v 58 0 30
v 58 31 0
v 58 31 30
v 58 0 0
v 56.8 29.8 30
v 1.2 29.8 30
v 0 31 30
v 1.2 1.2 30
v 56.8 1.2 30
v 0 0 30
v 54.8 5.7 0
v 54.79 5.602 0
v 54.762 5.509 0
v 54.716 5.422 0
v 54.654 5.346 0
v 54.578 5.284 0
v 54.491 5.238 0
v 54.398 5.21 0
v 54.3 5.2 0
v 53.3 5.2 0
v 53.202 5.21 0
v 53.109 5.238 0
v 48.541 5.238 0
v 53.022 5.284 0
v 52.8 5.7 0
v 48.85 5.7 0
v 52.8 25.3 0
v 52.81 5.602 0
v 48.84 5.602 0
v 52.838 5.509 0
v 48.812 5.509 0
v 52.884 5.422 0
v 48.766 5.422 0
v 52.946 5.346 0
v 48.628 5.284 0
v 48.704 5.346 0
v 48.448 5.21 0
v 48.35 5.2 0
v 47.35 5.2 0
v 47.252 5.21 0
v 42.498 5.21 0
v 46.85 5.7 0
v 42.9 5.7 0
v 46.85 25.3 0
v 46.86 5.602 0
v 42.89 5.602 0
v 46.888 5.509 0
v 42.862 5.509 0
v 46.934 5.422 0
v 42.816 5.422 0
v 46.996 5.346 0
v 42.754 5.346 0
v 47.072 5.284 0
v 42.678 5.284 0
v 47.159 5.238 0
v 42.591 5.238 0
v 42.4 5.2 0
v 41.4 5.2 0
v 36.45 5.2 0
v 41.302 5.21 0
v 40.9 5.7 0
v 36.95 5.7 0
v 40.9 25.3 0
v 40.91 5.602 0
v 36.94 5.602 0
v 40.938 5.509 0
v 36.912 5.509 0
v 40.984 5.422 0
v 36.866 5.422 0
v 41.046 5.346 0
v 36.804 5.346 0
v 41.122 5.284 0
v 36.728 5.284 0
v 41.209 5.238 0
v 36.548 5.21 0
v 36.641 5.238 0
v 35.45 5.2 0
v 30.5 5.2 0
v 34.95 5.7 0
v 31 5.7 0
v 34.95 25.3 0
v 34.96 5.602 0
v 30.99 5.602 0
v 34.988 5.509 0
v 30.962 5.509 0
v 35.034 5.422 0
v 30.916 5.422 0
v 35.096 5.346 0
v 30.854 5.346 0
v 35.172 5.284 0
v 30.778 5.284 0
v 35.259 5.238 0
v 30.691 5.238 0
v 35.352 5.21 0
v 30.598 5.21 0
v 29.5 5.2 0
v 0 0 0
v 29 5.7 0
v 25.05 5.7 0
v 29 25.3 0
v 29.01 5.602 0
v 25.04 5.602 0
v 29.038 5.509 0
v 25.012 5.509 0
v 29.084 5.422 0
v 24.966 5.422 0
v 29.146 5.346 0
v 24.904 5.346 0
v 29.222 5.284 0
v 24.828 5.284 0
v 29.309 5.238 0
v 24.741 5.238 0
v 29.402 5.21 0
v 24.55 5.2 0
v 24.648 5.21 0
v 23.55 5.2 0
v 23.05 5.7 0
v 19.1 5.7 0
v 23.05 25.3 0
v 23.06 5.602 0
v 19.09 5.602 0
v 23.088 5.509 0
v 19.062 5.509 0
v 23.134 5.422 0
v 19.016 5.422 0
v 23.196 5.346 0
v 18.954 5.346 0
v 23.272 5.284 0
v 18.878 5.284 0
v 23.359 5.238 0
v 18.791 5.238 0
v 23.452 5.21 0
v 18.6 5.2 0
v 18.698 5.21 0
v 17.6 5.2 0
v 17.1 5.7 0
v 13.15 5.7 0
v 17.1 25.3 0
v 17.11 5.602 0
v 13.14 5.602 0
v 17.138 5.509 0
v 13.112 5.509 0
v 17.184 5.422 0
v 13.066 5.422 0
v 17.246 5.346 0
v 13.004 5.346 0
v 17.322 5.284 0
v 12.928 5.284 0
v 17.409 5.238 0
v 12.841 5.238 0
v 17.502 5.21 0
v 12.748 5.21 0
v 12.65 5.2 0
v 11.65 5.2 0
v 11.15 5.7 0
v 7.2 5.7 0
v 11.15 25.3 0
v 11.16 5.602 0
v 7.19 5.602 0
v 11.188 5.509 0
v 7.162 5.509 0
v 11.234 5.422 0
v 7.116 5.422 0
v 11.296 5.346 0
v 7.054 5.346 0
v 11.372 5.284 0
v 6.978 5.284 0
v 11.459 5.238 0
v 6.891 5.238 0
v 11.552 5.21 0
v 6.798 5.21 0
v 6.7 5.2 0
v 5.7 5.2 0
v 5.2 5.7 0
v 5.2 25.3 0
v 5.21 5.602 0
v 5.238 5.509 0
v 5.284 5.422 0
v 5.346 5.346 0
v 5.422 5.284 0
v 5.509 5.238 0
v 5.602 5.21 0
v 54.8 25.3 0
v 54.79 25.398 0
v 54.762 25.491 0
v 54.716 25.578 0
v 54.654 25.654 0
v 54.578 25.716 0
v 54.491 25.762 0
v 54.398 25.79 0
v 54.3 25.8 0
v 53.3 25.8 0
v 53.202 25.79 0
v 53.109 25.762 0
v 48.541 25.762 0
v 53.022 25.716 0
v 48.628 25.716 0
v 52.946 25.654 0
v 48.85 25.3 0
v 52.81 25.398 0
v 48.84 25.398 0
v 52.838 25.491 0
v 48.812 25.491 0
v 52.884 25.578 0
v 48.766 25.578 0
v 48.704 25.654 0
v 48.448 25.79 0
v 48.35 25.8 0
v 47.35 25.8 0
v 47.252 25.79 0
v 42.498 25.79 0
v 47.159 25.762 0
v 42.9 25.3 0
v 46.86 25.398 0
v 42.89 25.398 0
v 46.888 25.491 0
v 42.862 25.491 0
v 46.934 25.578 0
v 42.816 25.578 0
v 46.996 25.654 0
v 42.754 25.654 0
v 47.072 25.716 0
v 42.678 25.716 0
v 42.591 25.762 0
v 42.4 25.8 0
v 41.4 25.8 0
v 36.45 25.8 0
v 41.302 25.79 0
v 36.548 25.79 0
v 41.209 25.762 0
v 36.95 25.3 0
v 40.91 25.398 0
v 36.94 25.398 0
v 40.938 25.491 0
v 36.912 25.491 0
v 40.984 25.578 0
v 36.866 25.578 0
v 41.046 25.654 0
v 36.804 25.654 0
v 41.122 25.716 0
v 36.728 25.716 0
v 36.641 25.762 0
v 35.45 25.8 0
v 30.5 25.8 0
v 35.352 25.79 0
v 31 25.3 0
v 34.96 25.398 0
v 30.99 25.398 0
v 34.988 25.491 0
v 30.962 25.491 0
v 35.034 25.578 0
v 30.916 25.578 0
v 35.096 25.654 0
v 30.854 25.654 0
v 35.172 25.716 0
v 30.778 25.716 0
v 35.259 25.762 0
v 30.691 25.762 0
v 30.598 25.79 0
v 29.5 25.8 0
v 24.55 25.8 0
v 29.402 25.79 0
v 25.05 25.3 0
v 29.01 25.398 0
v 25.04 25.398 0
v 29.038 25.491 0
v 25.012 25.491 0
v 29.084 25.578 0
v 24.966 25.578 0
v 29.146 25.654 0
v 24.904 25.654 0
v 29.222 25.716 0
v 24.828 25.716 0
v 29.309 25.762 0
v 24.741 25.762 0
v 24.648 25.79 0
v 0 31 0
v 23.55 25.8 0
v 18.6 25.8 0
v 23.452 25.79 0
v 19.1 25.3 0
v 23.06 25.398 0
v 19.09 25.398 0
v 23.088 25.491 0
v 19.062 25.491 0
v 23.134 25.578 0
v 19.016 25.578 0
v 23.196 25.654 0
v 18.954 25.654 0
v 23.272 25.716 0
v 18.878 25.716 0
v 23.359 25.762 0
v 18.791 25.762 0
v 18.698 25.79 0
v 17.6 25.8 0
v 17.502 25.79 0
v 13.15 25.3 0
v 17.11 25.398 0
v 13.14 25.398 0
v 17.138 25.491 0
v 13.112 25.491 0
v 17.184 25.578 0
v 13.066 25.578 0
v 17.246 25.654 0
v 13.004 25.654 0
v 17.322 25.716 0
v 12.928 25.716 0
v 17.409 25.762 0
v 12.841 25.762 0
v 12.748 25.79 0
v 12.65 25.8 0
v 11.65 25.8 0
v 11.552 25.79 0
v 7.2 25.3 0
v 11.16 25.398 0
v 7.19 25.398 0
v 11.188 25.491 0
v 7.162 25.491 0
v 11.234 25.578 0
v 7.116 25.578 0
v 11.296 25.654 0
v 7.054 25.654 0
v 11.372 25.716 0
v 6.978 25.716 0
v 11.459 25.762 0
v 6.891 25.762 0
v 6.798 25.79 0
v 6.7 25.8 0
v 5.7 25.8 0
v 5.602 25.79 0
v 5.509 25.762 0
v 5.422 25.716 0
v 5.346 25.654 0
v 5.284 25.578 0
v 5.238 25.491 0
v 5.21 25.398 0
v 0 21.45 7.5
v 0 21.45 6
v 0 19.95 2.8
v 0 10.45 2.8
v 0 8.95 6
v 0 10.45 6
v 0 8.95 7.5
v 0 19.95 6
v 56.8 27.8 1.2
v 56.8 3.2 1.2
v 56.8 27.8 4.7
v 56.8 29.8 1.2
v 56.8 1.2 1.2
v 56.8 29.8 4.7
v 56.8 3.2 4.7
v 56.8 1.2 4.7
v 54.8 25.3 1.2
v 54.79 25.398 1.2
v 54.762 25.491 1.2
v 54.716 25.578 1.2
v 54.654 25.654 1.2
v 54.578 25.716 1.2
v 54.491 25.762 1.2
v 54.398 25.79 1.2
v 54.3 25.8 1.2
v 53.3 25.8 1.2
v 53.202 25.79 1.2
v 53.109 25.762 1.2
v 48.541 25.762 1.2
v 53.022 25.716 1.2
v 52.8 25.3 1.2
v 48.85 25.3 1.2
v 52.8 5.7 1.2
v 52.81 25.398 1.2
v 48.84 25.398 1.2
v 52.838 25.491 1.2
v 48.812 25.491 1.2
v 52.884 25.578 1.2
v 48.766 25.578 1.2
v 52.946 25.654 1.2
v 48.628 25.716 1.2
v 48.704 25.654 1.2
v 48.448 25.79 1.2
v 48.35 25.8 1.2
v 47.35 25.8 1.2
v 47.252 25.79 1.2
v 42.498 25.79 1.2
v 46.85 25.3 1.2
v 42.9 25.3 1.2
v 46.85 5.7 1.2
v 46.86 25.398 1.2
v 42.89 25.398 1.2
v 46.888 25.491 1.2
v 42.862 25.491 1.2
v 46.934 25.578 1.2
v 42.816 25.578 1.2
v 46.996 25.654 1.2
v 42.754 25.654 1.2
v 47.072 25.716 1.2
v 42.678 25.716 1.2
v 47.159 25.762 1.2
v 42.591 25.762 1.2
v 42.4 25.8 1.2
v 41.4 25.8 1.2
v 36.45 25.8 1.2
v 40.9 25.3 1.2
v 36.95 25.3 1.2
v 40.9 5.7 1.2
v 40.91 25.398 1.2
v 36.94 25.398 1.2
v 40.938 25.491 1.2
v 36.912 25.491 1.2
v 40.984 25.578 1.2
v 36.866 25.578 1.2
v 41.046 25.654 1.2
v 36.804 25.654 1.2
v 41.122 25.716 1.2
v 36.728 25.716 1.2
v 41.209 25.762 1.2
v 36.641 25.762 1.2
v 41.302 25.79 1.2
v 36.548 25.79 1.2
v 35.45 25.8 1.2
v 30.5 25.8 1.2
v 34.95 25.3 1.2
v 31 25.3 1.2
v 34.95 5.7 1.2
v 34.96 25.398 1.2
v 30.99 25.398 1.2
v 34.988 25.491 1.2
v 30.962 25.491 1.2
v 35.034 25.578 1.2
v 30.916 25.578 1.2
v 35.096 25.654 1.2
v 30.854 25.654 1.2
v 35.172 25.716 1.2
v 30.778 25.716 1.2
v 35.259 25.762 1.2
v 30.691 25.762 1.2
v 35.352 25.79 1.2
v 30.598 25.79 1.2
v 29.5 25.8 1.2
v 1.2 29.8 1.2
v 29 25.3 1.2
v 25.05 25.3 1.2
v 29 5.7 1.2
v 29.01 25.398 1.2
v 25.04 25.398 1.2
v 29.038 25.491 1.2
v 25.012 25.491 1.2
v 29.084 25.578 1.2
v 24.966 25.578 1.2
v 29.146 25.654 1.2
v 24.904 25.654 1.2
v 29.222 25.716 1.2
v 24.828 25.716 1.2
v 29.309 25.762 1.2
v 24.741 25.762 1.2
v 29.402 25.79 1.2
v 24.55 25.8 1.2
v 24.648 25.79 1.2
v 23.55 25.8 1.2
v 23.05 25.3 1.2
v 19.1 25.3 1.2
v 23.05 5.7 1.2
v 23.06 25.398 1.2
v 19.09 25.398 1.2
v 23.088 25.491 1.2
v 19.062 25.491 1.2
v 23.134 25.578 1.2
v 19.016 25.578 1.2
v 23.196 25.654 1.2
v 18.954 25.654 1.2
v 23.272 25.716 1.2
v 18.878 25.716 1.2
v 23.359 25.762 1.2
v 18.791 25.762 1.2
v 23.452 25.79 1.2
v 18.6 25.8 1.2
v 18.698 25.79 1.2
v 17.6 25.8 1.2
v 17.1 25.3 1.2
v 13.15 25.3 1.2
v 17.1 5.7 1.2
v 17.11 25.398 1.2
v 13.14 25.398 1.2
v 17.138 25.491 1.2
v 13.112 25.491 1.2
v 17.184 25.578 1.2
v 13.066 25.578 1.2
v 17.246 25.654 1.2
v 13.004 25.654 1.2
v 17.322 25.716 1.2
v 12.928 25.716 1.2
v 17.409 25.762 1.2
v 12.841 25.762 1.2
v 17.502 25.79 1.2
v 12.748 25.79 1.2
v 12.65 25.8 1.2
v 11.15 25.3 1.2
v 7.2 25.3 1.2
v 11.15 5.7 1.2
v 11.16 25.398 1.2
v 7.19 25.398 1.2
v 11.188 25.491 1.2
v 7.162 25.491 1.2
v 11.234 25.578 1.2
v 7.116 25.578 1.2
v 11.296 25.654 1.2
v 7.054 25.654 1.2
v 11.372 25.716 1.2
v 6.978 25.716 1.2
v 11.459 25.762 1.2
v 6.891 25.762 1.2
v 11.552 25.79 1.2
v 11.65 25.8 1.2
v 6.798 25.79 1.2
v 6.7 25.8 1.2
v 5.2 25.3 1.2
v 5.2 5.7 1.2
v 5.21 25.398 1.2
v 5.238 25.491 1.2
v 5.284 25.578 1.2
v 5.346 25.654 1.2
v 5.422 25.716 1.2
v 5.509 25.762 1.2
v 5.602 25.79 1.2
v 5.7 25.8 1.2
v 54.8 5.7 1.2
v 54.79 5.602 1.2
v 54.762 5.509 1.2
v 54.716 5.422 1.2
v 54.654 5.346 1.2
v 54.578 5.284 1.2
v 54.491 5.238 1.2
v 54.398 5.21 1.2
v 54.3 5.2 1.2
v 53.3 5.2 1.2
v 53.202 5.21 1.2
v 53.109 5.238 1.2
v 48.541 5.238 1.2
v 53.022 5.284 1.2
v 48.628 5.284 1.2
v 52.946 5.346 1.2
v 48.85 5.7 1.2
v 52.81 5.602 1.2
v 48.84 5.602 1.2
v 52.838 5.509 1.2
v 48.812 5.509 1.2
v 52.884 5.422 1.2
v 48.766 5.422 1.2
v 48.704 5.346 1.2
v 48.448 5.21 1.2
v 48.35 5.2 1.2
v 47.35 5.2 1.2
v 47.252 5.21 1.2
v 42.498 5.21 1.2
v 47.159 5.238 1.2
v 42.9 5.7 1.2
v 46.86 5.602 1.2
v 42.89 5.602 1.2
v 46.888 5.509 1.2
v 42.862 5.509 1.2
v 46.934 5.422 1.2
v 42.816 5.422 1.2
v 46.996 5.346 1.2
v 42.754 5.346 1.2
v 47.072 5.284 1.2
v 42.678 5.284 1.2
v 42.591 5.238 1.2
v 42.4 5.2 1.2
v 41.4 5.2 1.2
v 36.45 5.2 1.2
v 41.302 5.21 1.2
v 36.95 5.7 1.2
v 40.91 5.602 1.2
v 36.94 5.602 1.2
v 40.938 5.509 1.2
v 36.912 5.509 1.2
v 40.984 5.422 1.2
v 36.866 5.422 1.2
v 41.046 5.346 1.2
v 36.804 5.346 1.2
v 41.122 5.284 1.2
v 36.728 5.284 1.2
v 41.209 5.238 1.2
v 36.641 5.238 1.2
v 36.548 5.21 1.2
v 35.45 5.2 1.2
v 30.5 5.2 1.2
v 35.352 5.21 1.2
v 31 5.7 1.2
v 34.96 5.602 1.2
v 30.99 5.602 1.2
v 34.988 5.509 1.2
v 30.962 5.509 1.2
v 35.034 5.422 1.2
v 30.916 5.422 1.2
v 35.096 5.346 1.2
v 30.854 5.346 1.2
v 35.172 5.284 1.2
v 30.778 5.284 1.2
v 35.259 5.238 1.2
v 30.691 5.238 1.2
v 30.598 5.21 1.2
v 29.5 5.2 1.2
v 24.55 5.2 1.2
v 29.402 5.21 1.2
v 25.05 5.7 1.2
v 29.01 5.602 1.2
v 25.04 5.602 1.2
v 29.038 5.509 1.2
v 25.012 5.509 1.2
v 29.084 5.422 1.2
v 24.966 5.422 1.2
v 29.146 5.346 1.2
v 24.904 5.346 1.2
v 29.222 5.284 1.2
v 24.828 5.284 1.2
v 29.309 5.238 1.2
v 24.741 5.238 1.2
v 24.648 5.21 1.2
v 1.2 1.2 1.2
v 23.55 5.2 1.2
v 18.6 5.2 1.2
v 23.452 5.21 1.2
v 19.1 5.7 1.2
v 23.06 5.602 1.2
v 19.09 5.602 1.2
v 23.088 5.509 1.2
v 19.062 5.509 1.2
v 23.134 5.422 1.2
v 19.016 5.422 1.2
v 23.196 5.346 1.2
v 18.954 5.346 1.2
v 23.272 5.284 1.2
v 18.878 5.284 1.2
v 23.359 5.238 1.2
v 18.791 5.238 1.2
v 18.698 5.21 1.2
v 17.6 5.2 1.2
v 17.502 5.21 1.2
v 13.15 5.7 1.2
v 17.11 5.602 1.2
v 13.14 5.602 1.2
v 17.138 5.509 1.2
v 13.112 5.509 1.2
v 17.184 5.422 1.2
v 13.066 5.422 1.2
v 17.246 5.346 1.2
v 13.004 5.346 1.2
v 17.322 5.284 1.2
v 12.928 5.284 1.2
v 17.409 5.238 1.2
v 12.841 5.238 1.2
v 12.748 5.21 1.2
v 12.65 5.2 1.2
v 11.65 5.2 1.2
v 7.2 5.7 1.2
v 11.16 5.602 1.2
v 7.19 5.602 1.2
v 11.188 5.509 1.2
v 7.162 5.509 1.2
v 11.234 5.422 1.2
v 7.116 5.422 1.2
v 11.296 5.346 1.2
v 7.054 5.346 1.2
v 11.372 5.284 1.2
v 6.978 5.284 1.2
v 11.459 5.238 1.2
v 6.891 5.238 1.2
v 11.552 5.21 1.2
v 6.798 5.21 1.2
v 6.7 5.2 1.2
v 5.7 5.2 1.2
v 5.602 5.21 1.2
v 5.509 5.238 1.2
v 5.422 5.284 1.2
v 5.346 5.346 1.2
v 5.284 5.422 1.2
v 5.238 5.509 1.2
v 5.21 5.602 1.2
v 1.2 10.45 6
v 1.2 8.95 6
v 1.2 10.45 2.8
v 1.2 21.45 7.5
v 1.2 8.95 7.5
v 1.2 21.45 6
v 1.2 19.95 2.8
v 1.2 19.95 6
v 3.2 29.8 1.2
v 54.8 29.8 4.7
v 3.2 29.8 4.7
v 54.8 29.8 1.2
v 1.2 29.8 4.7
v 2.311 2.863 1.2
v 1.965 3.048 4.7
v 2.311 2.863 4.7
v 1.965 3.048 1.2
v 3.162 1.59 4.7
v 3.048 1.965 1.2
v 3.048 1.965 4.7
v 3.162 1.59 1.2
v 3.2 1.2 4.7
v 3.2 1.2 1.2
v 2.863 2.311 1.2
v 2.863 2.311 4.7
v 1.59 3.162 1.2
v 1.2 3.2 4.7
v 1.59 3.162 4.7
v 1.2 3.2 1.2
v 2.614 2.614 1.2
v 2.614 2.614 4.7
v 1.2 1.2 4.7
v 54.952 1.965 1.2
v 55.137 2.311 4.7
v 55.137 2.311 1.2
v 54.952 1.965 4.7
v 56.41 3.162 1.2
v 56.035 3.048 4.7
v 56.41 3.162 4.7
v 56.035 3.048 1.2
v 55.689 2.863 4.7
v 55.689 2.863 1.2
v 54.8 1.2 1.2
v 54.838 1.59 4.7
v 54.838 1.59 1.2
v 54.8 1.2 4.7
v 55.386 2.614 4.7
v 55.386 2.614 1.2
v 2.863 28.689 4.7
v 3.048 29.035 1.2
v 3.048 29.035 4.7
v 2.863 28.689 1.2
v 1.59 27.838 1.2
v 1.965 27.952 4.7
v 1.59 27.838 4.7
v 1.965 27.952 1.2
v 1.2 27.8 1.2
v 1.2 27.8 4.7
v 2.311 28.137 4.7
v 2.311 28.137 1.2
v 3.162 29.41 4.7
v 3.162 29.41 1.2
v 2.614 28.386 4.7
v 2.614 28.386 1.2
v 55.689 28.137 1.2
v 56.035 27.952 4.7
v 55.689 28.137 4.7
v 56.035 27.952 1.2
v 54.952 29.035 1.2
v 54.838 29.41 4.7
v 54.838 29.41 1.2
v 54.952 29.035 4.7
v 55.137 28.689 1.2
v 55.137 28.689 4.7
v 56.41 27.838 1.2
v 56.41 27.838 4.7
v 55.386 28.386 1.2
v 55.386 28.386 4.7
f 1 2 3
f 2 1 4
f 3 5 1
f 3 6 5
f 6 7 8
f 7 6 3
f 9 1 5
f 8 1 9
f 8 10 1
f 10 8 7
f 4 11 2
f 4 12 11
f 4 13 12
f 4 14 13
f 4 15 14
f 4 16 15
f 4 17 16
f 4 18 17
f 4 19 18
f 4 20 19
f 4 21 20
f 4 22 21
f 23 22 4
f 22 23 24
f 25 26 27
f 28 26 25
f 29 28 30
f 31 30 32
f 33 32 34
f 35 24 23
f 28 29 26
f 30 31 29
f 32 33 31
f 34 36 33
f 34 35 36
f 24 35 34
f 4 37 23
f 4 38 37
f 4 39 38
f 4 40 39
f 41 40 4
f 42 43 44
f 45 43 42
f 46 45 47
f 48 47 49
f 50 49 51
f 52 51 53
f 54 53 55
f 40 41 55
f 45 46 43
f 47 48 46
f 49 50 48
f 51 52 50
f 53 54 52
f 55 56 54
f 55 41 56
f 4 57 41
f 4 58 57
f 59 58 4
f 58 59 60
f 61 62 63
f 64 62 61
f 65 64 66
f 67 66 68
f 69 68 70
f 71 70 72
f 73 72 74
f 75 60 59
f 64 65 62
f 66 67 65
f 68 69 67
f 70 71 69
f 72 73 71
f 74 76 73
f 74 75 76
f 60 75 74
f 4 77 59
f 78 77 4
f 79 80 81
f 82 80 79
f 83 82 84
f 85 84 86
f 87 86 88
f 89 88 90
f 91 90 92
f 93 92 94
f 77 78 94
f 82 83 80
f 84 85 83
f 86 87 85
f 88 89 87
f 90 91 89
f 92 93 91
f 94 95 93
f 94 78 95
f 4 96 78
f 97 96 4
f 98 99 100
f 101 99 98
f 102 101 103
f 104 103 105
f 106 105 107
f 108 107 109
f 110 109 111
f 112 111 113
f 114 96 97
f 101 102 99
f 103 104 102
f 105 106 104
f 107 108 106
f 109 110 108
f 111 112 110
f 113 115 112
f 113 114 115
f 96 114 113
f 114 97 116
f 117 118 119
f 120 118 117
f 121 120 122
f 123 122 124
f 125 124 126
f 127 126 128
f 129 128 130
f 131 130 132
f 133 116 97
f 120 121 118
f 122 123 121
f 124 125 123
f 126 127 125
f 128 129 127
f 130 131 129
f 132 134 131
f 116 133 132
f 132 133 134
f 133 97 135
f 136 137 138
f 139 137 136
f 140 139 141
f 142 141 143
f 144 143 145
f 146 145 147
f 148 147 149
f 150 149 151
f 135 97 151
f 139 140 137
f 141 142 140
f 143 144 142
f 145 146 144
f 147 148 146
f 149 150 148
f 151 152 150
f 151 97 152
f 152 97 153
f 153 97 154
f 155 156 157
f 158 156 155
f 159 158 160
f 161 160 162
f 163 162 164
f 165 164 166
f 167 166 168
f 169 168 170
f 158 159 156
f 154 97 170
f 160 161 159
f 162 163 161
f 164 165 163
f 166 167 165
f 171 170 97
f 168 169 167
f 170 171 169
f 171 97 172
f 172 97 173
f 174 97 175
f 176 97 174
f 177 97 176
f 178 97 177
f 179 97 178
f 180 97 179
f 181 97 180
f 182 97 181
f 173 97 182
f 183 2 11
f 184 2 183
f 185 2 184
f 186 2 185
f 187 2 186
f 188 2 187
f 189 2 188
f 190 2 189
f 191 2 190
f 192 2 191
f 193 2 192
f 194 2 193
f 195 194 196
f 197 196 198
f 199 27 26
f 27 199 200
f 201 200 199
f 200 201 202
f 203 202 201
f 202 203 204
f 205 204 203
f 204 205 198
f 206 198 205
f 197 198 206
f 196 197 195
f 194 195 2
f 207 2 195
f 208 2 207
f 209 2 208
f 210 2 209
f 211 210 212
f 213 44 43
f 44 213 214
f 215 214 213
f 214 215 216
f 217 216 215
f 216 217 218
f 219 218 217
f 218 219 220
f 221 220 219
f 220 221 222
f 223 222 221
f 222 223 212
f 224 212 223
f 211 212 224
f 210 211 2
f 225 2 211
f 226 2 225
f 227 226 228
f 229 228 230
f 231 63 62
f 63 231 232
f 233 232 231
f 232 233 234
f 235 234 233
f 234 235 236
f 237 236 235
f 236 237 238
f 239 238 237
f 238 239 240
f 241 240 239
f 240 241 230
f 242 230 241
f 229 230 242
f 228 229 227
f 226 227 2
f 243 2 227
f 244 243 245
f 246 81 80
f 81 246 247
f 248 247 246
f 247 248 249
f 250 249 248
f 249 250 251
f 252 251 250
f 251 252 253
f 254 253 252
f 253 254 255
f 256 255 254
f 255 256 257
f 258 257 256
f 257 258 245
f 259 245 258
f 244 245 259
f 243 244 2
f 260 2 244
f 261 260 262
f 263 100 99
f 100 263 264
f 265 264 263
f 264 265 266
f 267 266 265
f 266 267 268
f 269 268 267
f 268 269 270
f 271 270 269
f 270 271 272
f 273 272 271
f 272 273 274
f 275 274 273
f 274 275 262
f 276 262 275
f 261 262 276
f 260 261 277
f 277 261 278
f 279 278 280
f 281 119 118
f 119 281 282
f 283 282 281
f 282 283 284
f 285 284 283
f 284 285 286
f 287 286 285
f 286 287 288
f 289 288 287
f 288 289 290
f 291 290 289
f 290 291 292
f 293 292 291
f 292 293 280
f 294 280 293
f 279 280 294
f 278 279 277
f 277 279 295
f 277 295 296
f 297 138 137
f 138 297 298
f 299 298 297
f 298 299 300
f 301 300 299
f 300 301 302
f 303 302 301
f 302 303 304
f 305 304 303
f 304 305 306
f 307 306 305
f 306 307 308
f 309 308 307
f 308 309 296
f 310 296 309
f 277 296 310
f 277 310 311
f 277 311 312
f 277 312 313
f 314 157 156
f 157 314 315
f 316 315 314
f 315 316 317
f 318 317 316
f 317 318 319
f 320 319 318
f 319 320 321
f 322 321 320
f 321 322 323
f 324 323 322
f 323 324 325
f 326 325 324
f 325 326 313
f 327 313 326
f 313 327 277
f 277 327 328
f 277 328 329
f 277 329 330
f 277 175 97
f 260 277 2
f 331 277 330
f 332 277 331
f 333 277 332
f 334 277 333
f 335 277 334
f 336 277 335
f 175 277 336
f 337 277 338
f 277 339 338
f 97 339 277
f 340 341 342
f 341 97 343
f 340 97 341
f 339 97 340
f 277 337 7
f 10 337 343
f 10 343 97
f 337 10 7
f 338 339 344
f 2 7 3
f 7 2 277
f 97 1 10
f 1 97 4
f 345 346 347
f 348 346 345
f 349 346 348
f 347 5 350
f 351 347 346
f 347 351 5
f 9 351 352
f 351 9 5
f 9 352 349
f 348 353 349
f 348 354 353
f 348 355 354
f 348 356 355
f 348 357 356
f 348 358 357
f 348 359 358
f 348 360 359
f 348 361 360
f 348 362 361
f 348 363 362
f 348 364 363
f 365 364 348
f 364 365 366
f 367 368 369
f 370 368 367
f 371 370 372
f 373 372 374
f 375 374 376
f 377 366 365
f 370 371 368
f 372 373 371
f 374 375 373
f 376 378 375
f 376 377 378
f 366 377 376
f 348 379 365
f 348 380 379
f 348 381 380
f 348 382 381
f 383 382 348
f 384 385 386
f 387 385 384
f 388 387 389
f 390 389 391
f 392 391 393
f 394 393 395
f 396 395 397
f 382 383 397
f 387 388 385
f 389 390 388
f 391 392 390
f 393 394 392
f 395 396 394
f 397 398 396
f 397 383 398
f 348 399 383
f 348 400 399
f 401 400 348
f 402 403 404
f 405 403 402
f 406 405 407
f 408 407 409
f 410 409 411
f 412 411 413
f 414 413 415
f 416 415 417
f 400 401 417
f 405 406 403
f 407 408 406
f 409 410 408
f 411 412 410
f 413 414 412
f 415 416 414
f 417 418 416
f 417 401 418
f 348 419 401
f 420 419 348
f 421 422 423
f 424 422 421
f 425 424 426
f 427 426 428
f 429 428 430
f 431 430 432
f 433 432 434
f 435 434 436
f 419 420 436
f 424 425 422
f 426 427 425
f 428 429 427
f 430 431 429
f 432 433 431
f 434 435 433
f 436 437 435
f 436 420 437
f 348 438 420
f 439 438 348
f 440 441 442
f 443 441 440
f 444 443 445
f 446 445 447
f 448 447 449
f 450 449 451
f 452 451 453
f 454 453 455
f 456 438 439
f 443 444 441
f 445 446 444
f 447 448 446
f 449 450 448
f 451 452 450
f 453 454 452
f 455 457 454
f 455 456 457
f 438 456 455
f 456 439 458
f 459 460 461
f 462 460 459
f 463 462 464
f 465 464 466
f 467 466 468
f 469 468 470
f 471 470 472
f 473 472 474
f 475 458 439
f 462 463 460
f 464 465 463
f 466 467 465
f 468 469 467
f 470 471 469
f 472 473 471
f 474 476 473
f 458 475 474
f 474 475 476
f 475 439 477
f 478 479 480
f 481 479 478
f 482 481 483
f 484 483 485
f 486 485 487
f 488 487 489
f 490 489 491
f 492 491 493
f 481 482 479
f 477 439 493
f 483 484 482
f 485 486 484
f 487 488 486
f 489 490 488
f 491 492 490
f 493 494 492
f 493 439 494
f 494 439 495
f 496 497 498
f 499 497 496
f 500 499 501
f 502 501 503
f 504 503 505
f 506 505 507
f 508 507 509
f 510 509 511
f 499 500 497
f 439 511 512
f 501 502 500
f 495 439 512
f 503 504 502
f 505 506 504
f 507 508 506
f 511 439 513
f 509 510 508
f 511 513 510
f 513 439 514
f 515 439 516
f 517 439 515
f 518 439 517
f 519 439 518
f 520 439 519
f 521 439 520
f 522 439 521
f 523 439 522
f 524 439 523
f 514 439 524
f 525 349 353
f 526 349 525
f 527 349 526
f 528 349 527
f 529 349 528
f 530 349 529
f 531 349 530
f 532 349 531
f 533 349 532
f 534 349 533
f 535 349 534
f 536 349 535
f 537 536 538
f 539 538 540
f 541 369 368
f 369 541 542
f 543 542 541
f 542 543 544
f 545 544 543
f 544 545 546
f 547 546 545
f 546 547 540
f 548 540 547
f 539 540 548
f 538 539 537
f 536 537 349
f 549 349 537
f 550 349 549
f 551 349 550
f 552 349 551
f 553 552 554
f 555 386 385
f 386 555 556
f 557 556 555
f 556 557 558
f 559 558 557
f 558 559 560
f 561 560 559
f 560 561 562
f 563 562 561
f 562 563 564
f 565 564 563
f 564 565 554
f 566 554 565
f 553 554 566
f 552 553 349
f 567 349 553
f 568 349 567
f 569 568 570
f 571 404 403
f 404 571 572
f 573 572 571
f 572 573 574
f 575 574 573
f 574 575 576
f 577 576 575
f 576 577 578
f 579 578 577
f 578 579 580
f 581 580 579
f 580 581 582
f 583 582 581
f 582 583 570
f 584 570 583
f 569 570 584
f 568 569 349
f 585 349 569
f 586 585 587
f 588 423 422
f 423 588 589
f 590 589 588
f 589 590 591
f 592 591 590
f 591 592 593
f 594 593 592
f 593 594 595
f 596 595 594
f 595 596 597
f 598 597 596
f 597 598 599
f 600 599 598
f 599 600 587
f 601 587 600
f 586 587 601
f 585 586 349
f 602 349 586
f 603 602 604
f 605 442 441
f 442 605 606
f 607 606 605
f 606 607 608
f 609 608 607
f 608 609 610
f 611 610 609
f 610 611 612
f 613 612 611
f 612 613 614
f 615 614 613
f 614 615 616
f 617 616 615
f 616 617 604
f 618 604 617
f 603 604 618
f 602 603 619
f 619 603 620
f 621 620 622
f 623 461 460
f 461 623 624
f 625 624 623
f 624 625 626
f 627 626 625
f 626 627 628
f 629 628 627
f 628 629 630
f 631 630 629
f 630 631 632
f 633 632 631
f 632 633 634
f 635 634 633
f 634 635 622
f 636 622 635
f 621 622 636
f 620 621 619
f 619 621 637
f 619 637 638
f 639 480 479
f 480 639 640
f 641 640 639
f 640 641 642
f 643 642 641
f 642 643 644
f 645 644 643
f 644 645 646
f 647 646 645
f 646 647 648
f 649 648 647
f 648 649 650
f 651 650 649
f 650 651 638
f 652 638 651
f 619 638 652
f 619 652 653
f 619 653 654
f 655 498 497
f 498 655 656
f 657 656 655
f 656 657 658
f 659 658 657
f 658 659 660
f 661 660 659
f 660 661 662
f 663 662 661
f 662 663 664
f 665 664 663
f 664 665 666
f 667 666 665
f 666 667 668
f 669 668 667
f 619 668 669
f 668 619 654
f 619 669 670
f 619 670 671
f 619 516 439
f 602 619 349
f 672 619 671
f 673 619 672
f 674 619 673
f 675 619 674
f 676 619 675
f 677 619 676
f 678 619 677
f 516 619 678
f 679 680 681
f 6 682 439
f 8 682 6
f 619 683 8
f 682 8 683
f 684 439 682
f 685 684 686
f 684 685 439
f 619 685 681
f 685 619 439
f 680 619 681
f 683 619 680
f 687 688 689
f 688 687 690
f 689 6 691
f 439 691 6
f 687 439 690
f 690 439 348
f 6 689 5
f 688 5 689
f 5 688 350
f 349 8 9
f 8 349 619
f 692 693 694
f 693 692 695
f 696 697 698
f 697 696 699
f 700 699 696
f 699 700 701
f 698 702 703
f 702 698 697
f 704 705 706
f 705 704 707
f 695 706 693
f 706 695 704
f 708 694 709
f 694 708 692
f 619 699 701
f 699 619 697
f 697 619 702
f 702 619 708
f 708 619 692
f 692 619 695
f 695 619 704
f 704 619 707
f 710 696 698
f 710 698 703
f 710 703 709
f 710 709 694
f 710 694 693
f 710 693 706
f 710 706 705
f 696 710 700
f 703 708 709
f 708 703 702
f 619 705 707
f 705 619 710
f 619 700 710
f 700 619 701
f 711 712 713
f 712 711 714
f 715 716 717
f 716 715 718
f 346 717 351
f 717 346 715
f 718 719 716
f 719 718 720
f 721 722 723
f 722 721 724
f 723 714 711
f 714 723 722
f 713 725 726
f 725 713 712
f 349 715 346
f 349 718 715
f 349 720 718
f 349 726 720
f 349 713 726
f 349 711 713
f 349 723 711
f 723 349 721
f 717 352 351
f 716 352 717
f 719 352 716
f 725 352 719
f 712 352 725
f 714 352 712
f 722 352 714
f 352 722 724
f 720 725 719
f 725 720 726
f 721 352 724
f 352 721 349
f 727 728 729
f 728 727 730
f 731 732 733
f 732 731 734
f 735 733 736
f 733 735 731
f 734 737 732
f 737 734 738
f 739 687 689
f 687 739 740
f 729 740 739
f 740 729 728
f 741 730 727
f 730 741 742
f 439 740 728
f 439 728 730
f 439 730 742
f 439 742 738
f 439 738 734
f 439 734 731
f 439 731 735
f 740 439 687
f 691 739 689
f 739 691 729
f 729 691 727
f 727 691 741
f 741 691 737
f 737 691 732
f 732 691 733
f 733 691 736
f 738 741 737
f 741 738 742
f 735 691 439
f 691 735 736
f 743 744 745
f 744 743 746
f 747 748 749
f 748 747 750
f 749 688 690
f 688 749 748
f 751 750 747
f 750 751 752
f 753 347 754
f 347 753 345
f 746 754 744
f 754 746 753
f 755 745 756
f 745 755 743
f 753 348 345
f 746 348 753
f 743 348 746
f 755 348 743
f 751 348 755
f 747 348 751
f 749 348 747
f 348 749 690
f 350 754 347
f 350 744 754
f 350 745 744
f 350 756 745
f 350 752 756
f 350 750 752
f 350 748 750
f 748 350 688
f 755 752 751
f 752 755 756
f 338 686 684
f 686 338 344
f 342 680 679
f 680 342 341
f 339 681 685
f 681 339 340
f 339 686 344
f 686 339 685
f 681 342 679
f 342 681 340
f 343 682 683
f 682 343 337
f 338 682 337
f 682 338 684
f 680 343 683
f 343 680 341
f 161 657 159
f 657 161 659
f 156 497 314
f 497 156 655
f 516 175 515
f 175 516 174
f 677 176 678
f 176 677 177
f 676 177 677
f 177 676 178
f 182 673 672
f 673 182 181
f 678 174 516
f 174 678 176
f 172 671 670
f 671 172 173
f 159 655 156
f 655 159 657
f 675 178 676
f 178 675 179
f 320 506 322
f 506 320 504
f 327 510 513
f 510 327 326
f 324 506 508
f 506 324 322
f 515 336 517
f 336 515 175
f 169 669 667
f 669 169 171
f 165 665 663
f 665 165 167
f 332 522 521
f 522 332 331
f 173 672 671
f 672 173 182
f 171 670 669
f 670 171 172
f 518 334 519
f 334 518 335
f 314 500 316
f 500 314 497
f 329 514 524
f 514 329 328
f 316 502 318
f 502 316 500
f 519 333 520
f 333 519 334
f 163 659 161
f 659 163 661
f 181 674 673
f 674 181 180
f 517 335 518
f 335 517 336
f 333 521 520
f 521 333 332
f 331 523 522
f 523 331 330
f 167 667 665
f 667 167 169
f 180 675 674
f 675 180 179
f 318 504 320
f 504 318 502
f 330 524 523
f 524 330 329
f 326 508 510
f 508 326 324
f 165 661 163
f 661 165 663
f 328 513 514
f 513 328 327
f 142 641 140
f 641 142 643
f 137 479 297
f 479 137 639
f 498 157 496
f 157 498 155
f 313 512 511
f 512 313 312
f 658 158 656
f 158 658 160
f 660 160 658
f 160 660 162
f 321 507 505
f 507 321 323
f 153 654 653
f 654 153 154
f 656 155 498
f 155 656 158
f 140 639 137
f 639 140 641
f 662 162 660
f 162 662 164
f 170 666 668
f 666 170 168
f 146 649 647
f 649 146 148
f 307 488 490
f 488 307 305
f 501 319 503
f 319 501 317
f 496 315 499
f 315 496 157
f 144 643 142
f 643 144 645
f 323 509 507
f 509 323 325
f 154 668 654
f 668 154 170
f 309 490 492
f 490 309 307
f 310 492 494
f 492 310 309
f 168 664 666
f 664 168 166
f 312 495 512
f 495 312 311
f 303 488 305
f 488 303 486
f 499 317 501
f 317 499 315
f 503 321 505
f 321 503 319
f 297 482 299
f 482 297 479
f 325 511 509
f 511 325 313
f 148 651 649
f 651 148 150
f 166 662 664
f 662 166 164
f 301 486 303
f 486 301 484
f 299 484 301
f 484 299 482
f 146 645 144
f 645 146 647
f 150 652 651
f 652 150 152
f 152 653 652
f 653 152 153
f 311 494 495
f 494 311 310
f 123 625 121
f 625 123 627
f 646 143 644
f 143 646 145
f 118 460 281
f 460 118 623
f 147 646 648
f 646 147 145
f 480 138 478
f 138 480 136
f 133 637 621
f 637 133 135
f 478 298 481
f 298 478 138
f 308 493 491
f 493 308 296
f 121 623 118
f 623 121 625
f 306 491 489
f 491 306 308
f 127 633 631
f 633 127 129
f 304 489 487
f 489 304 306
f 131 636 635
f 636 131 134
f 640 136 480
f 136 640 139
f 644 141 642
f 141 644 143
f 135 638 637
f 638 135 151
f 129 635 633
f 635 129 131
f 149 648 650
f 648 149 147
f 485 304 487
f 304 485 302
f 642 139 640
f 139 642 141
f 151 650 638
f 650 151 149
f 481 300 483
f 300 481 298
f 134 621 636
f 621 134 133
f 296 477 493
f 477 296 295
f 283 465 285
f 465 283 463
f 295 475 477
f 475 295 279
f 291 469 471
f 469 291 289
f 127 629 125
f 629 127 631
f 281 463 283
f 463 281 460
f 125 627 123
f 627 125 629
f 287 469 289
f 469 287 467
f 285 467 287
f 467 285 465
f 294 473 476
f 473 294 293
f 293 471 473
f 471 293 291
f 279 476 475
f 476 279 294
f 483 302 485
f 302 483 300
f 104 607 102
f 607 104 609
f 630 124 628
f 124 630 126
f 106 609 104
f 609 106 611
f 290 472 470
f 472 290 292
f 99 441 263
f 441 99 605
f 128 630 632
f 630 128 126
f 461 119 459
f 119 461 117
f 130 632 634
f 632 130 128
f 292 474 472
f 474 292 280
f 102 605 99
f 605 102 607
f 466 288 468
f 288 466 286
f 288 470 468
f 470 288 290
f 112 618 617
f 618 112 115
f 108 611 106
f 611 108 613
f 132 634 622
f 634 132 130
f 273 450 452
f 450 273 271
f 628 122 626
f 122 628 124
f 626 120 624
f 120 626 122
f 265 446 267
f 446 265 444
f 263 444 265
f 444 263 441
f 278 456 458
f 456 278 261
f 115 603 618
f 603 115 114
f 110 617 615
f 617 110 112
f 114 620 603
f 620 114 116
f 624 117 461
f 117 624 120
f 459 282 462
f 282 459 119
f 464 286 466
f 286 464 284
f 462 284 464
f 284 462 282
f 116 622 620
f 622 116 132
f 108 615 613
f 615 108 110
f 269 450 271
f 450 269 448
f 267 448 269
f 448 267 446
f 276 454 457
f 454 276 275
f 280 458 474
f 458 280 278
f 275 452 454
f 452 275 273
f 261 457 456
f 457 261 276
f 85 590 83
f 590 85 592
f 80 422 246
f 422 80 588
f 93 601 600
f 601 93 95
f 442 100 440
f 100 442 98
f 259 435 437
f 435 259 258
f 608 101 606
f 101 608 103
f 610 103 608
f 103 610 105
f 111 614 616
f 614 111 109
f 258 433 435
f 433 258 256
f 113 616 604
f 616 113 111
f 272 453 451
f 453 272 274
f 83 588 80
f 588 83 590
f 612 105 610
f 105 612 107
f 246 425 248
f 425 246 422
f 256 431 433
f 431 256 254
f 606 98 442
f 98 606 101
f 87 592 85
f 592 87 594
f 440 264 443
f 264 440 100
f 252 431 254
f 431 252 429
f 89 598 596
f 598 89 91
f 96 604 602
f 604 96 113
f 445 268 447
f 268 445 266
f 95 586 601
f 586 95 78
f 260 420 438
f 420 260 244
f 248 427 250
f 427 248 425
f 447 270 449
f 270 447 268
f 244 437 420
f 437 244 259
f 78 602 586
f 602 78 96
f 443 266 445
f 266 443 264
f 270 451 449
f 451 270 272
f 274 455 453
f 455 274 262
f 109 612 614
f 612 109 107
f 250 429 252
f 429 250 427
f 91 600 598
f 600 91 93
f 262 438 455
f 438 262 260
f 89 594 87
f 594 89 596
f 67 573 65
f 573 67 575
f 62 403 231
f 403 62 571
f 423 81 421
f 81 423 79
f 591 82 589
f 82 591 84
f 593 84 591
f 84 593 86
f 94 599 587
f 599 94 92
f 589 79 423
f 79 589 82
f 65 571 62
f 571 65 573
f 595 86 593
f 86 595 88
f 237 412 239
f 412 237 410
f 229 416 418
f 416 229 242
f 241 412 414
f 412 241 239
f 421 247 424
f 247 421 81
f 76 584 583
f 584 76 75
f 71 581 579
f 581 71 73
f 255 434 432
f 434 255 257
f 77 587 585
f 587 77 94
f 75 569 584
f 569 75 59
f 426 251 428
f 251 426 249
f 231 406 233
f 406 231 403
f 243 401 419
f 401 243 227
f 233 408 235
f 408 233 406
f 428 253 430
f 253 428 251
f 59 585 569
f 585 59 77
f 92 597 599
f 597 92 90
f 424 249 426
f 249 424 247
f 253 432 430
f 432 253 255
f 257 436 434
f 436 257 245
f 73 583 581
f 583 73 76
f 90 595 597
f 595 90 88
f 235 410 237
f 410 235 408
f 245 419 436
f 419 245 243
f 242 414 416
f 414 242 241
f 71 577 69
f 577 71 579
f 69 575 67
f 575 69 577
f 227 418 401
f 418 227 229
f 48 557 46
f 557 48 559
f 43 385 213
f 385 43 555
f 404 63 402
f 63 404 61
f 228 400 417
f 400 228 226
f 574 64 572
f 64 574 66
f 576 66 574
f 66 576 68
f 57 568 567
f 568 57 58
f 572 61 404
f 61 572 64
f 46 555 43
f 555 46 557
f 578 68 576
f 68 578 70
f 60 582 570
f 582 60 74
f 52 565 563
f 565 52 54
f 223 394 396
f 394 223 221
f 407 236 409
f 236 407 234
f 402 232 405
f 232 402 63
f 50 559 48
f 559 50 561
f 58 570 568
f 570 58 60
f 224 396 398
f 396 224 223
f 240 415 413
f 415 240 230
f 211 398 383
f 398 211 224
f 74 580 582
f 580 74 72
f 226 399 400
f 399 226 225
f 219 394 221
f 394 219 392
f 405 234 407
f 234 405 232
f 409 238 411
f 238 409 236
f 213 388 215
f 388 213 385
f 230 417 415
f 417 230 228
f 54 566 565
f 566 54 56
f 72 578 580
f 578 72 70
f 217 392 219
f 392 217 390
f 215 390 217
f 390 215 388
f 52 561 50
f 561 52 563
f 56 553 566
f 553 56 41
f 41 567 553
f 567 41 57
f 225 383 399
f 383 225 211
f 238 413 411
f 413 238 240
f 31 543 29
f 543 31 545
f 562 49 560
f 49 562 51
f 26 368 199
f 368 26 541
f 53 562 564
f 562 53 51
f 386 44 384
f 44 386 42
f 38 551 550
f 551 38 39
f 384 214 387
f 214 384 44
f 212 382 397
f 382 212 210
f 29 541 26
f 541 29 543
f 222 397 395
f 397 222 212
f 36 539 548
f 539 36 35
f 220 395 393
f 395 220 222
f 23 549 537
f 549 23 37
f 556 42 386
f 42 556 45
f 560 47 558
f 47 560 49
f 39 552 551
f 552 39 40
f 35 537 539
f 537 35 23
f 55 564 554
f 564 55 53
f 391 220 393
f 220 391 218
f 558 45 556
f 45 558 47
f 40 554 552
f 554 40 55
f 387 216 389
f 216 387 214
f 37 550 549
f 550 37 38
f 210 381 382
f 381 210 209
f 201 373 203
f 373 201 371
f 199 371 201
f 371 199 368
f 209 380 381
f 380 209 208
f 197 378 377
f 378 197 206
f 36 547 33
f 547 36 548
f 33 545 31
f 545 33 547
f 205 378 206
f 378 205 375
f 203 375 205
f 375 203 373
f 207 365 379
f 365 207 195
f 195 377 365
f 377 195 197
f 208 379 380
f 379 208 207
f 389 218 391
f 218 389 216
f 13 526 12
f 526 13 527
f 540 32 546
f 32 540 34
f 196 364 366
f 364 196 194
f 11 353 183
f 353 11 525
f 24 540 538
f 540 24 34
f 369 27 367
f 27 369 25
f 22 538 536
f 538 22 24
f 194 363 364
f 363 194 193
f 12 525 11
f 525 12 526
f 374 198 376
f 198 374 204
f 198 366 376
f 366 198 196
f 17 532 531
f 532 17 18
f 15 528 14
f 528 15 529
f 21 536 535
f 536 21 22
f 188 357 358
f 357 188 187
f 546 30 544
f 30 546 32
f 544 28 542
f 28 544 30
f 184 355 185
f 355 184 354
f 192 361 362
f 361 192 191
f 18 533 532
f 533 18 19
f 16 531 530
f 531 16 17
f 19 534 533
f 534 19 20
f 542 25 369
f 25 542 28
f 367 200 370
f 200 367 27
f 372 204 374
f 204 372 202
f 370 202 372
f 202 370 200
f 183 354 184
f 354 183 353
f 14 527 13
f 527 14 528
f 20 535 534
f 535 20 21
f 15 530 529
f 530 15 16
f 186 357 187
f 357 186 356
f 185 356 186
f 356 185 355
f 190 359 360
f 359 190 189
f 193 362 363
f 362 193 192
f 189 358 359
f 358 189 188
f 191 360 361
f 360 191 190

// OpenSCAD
// =====================================================
// ClaudeLight 外壳 v3 - 底托 + 顶板, 红绿灯裸露
//
// 两件拼合:
//   - 底托 (tray): 敞口, ESP-32E 从上方放入
//   - 顶板 (cap): 覆盖底托, 开插槽让红绿灯竖直露出
//   - M2 螺丝从底面固定
//
// 打印建议:
//   - 底托: 敞口朝上打印, 无需支撑
//   - 顶板: 平面朝下打印, 无需支撑
//   - 材料: PLA/PETG, 0.2mm 层高, 3 回墙
// =====================================================

// ============== 可调参数 ==============

// ESP-32E 开发板
ESP_LEN     = 55;     // 长度 (USB-C 端到另一端)
ESP_WID     = 28;     // 宽度
ESP_PCB_H   = 1.6;    // PCB 厚度
ESP_MOD_H   = 10;     // 射频模块凸起
ESP_USB_W   = 9.5;    // USB-C 口宽度
ESP_USB_H   = 3.2;    // USB-C 口高度
ESP_USB_OFF = 0;      // USB-C 口中心 Y 偏移 (0=居中)

// 红绿灯模块
TL_LEN      = 75;     // PCB 总长
TL_WID      = 14;     // PCB 宽度
TL_PCB_H    = 1.6;    // PCB 厚度
TL_INSERT   = 8;      // 插入底座内的深度

// 外壳通用
WALL        = 1.2;    // 壁厚 (已减薄)
TOL         = 0.3;    // 间隙余量 (单侧)
CORNER_R    = 0;      // 圆角半径 (0=直角)

// 底托高度 (直接控制总高)
TRAY_TARGET_H = 30;   // 目标底托总高 (mm)

// ============== 计算值 ==============

INNER_L = ESP_LEN + 2*TOL;
INNER_W = ESP_WID + 2*TOL;
INNER_H = ESP_PCB_H + ESP_MOD_H + TOL + 1;  // 内腔高度

OUTER_L = INNER_L + 2*WALL;
OUTER_W = INNER_W + 2*WALL;

// 底托高度: 取内腔需求和目标高度中较大值
TRAY_H  = max(TRAY_TARGET_H, INNER_H + WALL);

// 顶板
CAP_TOP = 3;       // 插口实心厚度 (红绿灯夹持区域, 建议 ≥3mm)
CAP_H   = CAP_TOP;  // 顶板就是纯平板, 无空腔

// 四角支撑圆柱
CORNER_PAD_R  = 2;    // 1/4 圆柱半径
CORNER_PAD_H  = 3.5;  // 支撑面高度 (PCB 落在此高度上)

// 插槽
SLOT_W  = TL_WID + 2*TOL;
SLOT_D  = 3.3;        // 插槽缝隙宽度 (PCB+焊点厚度, 建议 ≥3mm)
SLOT_X  = OUTER_L / 2 - SLOT_W / 2;

// 螺丝位置 - USB 侧两个靠追拹左移避开按钮
USB_SIDE_MARGIN = 8;   // USB 侧螺丝柱 Y 方向偏移远离 USB 口
SCREW_MARGIN = 5.5;
SCREW_POSITIONS = [
  // USB 侧 (左端): 两个柱向中间偶移, 避开 USB 口旁的按钮
  [SCREW_MARGIN,            WALL + USB_SIDE_MARGIN],
  [SCREW_MARGIN,            OUTER_W - WALL - USB_SIDE_MARGIN],
  // 右端: 正常四角
  [OUTER_L - SCREW_MARGIN,  SCREW_MARGIN],
  [OUTER_L - SCREW_MARGIN,  OUTER_W - SCREW_MARGIN],
];

$fn = 32;

// ============== 渲染控制 ==============
// "all" = 装配, "tray" = 底托, "cap" = 顶板, "exploded" = 分解
PART = "tray";

// =====================================================
// 公共: 圆角矩形
// =====================================================

module rounded_box(l, w, h, r) {
  if (r <= 0) {
    cube([l, w, h]);
  } else {
    hull() {
      translate([r, r, 0])       cylinder(r=r, h=h);
      translate([l-r, r, 0])     cylinder(r=r, h=h);
      translate([r, w-r, 0])     cylinder(r=r, h=h);
      translate([l-r, w-r, 0])   cylinder(r=r, h=h);
    }
  }
}

// =====================================================
// 底托 (敞口盒子)
// =====================================================

module tray_body() {
  difference() {
    rounded_box(OUTER_L, OUTER_W, TRAY_H, CORNER_R);
    // 顶面敞口 - 掏空内腔
    translate([WALL, WALL, WALL])
      cube([INNER_L, INNER_W, TRAY_H]);
  }
}

module tray_usb_cutout() {
  usb_y = WALL + ESP_WID/2 + ESP_USB_OFF - ESP_USB_W/2;
  // USB-C 开口 (前端面)
  translate([-1, usb_y, WALL + ESP_PCB_H])
    cube([WALL+2, ESP_USB_W, ESP_USB_H]);
  // 上沿倒角 (方便插线)
  translate([-1, usb_y - 1.5, WALL + ESP_PCB_H + ESP_USB_H])
    cube([WALL+2, ESP_USB_W + 3, 1.5]);
}

// 底部四角贴墙 1/4 圆柱支撑 PCB
module tray_corner_pads() {
  r = CORNER_PAD_R;
  h = CORNER_PAD_H;

  // 四角位置和对应的旋转角度
  corners = [
    [WALL,          WALL,          0],    // 左前角: 0°
    [OUTER_L-WALL,  WALL,          90],   // 右前角: 90°
    [WALL,          OUTER_W-WALL,  270],  // 左后角: 270°
    [OUTER_L-WALL,  OUTER_W-WALL,  180],  // 右后角: 180°
  ];

  for (c = corners) {
    translate([c[0], c[1], WALL])
      rotate([0, 0, c[2]])
        intersection() {
          cylinder(r=r, h=h);
          cube([r, r, h]);
        }
  }
}

module tray_standoffs() {
  // PCB 支撑 + 螺丝柱 (筒径减小, 避开按钮)
  hole_r     = 1.1;   // M2 过孔
  boss_r     = 2.5;   // 柱外径 (已减小)
  boss_h     = TRAY_H - WALL - 2;  // 柱高 (适配底托高度)
  step_r     = 1.8;   // 台阶半径
  step_h     = 3.5;   // 台阶高度 (PCB 安装面)

  for (pos = SCREW_POSITIONS) {
    translate([pos[0], pos[1], WALL])
      difference() {
        cylinder(r=boss_r, h=boss_h);
        translate([0, 0, -1])
          cylinder(r=hole_r, h=boss_h + 2);
        translate([0, 0, step_h])
          cylinder(r=boss_r + 1, h=boss_h);
      }
    // 台阶环
    translate([pos[0], pos[1], WALL])
      difference() {
        cylinder(r=step_r, h=step_h);
        cylinder(r=hole_r, h=step_h + 1);
      }
  }
}

module tray_screw_holes() {
  // M2 螺丝过孔 + 沉头 (从底面拧入)
  hole_r = 1.1;
  sink_r = 2.2;
  for (pos = SCREW_POSITIONS) {
    translate([pos[0], pos[1], -1]) {
      cylinder(r=sink_r, h=WALL * 0.6);   // 沉头
      cylinder(r=hole_r, h=TRAY_H + 2);    // 过孔贯穿到底托顶面
    }
  }
}



module tray_vent_slots() {
  // 底板散热槽
  slot_w = 2;
  n_slots = floor(INNER_L / 6);
  for (i = [0 : n_slots - 1]) {
    x = WALL + 4 + i * (INNER_L - 8) / max(n_slots - 1, 1);
    translate([x, WALL + 4, -1])
      rounded_box(slot_w, INNER_W - 8, WALL + 2, 0.5);
  }
}



module tray() {
  difference() {
    union() {
      tray_body();
      tray_corner_pads();
    }
    tray_usb_cutout();
    tray_vent_slots();
  }
}

// =====================================================
// 顶板 (平板 + 插槽 + 弹片)
// =====================================================

module cap_body() {
  // 纯实心平板, 无空腔, 打印友好
  rounded_box(OUTER_L, OUTER_W, CAP_H, CORNER_R);
}

module cap_slot() {
  // 红绿灯 PCB 插槽 (贯穿顶板)
  translate([SLOT_X, OUTER_W/2 - SLOT_D/2, -1])
    cube([SLOT_W, SLOT_D, CAP_H + 2]);

  // 插槽两端圆角 (PCB 滑入引导)
  for (dx = [0, SLOT_W - 2*TOL]) {
    translate([SLOT_X + dx, OUTER_W/2, -1])
      cylinder(r=SLOT_D/2 + 0.3, h=CAP_H + 2);
  }
}

module cap_clips() {
  // PCB 弹片 - 从平板底面向下延伸的两条薄肋, 夹住 PCB
  rib_w = 1.0;
  rib_h = TL_INSERT - 1;  // 向下伸入底托内的长度
  gap   = SLOT_D;  // 跟随插槽宽度

  for (sign = [-1, 1]) {
    y_pos = OUTER_W/2 + sign * (gap/2 + rib_w/2);
    translate([SLOT_X - 1, y_pos - rib_w/2, -rib_h])
      cube([SLOT_W + 2, rib_w, rib_h]);
  }
}

module cap_screw_holes() {
  hole_r = 1.1;
  sink_r = 2;
  for (pos = SCREW_POSITIONS) {
    translate([pos[0], pos[1], -1]) {
      cylinder(r=hole_r, h=CAP_H + 2);  // 过孔
    }
    // 沉头在顶面
    translate([pos[0], pos[1], CAP_H - WALL * 0.8])
      cylinder(r=sink_r, h=WALL);
  }
}



module cap() {
  difference() {
    union() {
      cap_body();
      cap_clips();
    }
    cap_slot();
  }
}

// =====================================================
// 调试: 板子位置 (半透明)
// =====================================================

module debug_pcbs() {
  %color("gray", 0.4)
    translate([WALL + TOL, WALL + TOL, WALL + 3.5])
      cube([ESP_LEN, ESP_WID, ESP_PCB_H]);

  %color("green", 0.5)
    translate([SLOT_X + TOL, OUTER_W/2 - TL_PCB_H/2, TRAY_H + CAP_H - TL_INSERT])
      cube([TL_WID, TL_PCB_H, TL_LEN]);
}

// =====================================================
// 渲染
// =====================================================

if (PART == "tray") {
  tray();
}
else if (PART == "cap") {
  cap();
}
else if (PART == "exploded") {
  // 底托在下面
  tray();
  // 顶板向上分离
  translate([0, 0, TRAY_H + 15])
    cap();
  debug_pcbs();
}
else {
  // 完整装配
  tray();
  translate([0, 0, TRAY_H])
    cap();
  debug_pcbs();
}
